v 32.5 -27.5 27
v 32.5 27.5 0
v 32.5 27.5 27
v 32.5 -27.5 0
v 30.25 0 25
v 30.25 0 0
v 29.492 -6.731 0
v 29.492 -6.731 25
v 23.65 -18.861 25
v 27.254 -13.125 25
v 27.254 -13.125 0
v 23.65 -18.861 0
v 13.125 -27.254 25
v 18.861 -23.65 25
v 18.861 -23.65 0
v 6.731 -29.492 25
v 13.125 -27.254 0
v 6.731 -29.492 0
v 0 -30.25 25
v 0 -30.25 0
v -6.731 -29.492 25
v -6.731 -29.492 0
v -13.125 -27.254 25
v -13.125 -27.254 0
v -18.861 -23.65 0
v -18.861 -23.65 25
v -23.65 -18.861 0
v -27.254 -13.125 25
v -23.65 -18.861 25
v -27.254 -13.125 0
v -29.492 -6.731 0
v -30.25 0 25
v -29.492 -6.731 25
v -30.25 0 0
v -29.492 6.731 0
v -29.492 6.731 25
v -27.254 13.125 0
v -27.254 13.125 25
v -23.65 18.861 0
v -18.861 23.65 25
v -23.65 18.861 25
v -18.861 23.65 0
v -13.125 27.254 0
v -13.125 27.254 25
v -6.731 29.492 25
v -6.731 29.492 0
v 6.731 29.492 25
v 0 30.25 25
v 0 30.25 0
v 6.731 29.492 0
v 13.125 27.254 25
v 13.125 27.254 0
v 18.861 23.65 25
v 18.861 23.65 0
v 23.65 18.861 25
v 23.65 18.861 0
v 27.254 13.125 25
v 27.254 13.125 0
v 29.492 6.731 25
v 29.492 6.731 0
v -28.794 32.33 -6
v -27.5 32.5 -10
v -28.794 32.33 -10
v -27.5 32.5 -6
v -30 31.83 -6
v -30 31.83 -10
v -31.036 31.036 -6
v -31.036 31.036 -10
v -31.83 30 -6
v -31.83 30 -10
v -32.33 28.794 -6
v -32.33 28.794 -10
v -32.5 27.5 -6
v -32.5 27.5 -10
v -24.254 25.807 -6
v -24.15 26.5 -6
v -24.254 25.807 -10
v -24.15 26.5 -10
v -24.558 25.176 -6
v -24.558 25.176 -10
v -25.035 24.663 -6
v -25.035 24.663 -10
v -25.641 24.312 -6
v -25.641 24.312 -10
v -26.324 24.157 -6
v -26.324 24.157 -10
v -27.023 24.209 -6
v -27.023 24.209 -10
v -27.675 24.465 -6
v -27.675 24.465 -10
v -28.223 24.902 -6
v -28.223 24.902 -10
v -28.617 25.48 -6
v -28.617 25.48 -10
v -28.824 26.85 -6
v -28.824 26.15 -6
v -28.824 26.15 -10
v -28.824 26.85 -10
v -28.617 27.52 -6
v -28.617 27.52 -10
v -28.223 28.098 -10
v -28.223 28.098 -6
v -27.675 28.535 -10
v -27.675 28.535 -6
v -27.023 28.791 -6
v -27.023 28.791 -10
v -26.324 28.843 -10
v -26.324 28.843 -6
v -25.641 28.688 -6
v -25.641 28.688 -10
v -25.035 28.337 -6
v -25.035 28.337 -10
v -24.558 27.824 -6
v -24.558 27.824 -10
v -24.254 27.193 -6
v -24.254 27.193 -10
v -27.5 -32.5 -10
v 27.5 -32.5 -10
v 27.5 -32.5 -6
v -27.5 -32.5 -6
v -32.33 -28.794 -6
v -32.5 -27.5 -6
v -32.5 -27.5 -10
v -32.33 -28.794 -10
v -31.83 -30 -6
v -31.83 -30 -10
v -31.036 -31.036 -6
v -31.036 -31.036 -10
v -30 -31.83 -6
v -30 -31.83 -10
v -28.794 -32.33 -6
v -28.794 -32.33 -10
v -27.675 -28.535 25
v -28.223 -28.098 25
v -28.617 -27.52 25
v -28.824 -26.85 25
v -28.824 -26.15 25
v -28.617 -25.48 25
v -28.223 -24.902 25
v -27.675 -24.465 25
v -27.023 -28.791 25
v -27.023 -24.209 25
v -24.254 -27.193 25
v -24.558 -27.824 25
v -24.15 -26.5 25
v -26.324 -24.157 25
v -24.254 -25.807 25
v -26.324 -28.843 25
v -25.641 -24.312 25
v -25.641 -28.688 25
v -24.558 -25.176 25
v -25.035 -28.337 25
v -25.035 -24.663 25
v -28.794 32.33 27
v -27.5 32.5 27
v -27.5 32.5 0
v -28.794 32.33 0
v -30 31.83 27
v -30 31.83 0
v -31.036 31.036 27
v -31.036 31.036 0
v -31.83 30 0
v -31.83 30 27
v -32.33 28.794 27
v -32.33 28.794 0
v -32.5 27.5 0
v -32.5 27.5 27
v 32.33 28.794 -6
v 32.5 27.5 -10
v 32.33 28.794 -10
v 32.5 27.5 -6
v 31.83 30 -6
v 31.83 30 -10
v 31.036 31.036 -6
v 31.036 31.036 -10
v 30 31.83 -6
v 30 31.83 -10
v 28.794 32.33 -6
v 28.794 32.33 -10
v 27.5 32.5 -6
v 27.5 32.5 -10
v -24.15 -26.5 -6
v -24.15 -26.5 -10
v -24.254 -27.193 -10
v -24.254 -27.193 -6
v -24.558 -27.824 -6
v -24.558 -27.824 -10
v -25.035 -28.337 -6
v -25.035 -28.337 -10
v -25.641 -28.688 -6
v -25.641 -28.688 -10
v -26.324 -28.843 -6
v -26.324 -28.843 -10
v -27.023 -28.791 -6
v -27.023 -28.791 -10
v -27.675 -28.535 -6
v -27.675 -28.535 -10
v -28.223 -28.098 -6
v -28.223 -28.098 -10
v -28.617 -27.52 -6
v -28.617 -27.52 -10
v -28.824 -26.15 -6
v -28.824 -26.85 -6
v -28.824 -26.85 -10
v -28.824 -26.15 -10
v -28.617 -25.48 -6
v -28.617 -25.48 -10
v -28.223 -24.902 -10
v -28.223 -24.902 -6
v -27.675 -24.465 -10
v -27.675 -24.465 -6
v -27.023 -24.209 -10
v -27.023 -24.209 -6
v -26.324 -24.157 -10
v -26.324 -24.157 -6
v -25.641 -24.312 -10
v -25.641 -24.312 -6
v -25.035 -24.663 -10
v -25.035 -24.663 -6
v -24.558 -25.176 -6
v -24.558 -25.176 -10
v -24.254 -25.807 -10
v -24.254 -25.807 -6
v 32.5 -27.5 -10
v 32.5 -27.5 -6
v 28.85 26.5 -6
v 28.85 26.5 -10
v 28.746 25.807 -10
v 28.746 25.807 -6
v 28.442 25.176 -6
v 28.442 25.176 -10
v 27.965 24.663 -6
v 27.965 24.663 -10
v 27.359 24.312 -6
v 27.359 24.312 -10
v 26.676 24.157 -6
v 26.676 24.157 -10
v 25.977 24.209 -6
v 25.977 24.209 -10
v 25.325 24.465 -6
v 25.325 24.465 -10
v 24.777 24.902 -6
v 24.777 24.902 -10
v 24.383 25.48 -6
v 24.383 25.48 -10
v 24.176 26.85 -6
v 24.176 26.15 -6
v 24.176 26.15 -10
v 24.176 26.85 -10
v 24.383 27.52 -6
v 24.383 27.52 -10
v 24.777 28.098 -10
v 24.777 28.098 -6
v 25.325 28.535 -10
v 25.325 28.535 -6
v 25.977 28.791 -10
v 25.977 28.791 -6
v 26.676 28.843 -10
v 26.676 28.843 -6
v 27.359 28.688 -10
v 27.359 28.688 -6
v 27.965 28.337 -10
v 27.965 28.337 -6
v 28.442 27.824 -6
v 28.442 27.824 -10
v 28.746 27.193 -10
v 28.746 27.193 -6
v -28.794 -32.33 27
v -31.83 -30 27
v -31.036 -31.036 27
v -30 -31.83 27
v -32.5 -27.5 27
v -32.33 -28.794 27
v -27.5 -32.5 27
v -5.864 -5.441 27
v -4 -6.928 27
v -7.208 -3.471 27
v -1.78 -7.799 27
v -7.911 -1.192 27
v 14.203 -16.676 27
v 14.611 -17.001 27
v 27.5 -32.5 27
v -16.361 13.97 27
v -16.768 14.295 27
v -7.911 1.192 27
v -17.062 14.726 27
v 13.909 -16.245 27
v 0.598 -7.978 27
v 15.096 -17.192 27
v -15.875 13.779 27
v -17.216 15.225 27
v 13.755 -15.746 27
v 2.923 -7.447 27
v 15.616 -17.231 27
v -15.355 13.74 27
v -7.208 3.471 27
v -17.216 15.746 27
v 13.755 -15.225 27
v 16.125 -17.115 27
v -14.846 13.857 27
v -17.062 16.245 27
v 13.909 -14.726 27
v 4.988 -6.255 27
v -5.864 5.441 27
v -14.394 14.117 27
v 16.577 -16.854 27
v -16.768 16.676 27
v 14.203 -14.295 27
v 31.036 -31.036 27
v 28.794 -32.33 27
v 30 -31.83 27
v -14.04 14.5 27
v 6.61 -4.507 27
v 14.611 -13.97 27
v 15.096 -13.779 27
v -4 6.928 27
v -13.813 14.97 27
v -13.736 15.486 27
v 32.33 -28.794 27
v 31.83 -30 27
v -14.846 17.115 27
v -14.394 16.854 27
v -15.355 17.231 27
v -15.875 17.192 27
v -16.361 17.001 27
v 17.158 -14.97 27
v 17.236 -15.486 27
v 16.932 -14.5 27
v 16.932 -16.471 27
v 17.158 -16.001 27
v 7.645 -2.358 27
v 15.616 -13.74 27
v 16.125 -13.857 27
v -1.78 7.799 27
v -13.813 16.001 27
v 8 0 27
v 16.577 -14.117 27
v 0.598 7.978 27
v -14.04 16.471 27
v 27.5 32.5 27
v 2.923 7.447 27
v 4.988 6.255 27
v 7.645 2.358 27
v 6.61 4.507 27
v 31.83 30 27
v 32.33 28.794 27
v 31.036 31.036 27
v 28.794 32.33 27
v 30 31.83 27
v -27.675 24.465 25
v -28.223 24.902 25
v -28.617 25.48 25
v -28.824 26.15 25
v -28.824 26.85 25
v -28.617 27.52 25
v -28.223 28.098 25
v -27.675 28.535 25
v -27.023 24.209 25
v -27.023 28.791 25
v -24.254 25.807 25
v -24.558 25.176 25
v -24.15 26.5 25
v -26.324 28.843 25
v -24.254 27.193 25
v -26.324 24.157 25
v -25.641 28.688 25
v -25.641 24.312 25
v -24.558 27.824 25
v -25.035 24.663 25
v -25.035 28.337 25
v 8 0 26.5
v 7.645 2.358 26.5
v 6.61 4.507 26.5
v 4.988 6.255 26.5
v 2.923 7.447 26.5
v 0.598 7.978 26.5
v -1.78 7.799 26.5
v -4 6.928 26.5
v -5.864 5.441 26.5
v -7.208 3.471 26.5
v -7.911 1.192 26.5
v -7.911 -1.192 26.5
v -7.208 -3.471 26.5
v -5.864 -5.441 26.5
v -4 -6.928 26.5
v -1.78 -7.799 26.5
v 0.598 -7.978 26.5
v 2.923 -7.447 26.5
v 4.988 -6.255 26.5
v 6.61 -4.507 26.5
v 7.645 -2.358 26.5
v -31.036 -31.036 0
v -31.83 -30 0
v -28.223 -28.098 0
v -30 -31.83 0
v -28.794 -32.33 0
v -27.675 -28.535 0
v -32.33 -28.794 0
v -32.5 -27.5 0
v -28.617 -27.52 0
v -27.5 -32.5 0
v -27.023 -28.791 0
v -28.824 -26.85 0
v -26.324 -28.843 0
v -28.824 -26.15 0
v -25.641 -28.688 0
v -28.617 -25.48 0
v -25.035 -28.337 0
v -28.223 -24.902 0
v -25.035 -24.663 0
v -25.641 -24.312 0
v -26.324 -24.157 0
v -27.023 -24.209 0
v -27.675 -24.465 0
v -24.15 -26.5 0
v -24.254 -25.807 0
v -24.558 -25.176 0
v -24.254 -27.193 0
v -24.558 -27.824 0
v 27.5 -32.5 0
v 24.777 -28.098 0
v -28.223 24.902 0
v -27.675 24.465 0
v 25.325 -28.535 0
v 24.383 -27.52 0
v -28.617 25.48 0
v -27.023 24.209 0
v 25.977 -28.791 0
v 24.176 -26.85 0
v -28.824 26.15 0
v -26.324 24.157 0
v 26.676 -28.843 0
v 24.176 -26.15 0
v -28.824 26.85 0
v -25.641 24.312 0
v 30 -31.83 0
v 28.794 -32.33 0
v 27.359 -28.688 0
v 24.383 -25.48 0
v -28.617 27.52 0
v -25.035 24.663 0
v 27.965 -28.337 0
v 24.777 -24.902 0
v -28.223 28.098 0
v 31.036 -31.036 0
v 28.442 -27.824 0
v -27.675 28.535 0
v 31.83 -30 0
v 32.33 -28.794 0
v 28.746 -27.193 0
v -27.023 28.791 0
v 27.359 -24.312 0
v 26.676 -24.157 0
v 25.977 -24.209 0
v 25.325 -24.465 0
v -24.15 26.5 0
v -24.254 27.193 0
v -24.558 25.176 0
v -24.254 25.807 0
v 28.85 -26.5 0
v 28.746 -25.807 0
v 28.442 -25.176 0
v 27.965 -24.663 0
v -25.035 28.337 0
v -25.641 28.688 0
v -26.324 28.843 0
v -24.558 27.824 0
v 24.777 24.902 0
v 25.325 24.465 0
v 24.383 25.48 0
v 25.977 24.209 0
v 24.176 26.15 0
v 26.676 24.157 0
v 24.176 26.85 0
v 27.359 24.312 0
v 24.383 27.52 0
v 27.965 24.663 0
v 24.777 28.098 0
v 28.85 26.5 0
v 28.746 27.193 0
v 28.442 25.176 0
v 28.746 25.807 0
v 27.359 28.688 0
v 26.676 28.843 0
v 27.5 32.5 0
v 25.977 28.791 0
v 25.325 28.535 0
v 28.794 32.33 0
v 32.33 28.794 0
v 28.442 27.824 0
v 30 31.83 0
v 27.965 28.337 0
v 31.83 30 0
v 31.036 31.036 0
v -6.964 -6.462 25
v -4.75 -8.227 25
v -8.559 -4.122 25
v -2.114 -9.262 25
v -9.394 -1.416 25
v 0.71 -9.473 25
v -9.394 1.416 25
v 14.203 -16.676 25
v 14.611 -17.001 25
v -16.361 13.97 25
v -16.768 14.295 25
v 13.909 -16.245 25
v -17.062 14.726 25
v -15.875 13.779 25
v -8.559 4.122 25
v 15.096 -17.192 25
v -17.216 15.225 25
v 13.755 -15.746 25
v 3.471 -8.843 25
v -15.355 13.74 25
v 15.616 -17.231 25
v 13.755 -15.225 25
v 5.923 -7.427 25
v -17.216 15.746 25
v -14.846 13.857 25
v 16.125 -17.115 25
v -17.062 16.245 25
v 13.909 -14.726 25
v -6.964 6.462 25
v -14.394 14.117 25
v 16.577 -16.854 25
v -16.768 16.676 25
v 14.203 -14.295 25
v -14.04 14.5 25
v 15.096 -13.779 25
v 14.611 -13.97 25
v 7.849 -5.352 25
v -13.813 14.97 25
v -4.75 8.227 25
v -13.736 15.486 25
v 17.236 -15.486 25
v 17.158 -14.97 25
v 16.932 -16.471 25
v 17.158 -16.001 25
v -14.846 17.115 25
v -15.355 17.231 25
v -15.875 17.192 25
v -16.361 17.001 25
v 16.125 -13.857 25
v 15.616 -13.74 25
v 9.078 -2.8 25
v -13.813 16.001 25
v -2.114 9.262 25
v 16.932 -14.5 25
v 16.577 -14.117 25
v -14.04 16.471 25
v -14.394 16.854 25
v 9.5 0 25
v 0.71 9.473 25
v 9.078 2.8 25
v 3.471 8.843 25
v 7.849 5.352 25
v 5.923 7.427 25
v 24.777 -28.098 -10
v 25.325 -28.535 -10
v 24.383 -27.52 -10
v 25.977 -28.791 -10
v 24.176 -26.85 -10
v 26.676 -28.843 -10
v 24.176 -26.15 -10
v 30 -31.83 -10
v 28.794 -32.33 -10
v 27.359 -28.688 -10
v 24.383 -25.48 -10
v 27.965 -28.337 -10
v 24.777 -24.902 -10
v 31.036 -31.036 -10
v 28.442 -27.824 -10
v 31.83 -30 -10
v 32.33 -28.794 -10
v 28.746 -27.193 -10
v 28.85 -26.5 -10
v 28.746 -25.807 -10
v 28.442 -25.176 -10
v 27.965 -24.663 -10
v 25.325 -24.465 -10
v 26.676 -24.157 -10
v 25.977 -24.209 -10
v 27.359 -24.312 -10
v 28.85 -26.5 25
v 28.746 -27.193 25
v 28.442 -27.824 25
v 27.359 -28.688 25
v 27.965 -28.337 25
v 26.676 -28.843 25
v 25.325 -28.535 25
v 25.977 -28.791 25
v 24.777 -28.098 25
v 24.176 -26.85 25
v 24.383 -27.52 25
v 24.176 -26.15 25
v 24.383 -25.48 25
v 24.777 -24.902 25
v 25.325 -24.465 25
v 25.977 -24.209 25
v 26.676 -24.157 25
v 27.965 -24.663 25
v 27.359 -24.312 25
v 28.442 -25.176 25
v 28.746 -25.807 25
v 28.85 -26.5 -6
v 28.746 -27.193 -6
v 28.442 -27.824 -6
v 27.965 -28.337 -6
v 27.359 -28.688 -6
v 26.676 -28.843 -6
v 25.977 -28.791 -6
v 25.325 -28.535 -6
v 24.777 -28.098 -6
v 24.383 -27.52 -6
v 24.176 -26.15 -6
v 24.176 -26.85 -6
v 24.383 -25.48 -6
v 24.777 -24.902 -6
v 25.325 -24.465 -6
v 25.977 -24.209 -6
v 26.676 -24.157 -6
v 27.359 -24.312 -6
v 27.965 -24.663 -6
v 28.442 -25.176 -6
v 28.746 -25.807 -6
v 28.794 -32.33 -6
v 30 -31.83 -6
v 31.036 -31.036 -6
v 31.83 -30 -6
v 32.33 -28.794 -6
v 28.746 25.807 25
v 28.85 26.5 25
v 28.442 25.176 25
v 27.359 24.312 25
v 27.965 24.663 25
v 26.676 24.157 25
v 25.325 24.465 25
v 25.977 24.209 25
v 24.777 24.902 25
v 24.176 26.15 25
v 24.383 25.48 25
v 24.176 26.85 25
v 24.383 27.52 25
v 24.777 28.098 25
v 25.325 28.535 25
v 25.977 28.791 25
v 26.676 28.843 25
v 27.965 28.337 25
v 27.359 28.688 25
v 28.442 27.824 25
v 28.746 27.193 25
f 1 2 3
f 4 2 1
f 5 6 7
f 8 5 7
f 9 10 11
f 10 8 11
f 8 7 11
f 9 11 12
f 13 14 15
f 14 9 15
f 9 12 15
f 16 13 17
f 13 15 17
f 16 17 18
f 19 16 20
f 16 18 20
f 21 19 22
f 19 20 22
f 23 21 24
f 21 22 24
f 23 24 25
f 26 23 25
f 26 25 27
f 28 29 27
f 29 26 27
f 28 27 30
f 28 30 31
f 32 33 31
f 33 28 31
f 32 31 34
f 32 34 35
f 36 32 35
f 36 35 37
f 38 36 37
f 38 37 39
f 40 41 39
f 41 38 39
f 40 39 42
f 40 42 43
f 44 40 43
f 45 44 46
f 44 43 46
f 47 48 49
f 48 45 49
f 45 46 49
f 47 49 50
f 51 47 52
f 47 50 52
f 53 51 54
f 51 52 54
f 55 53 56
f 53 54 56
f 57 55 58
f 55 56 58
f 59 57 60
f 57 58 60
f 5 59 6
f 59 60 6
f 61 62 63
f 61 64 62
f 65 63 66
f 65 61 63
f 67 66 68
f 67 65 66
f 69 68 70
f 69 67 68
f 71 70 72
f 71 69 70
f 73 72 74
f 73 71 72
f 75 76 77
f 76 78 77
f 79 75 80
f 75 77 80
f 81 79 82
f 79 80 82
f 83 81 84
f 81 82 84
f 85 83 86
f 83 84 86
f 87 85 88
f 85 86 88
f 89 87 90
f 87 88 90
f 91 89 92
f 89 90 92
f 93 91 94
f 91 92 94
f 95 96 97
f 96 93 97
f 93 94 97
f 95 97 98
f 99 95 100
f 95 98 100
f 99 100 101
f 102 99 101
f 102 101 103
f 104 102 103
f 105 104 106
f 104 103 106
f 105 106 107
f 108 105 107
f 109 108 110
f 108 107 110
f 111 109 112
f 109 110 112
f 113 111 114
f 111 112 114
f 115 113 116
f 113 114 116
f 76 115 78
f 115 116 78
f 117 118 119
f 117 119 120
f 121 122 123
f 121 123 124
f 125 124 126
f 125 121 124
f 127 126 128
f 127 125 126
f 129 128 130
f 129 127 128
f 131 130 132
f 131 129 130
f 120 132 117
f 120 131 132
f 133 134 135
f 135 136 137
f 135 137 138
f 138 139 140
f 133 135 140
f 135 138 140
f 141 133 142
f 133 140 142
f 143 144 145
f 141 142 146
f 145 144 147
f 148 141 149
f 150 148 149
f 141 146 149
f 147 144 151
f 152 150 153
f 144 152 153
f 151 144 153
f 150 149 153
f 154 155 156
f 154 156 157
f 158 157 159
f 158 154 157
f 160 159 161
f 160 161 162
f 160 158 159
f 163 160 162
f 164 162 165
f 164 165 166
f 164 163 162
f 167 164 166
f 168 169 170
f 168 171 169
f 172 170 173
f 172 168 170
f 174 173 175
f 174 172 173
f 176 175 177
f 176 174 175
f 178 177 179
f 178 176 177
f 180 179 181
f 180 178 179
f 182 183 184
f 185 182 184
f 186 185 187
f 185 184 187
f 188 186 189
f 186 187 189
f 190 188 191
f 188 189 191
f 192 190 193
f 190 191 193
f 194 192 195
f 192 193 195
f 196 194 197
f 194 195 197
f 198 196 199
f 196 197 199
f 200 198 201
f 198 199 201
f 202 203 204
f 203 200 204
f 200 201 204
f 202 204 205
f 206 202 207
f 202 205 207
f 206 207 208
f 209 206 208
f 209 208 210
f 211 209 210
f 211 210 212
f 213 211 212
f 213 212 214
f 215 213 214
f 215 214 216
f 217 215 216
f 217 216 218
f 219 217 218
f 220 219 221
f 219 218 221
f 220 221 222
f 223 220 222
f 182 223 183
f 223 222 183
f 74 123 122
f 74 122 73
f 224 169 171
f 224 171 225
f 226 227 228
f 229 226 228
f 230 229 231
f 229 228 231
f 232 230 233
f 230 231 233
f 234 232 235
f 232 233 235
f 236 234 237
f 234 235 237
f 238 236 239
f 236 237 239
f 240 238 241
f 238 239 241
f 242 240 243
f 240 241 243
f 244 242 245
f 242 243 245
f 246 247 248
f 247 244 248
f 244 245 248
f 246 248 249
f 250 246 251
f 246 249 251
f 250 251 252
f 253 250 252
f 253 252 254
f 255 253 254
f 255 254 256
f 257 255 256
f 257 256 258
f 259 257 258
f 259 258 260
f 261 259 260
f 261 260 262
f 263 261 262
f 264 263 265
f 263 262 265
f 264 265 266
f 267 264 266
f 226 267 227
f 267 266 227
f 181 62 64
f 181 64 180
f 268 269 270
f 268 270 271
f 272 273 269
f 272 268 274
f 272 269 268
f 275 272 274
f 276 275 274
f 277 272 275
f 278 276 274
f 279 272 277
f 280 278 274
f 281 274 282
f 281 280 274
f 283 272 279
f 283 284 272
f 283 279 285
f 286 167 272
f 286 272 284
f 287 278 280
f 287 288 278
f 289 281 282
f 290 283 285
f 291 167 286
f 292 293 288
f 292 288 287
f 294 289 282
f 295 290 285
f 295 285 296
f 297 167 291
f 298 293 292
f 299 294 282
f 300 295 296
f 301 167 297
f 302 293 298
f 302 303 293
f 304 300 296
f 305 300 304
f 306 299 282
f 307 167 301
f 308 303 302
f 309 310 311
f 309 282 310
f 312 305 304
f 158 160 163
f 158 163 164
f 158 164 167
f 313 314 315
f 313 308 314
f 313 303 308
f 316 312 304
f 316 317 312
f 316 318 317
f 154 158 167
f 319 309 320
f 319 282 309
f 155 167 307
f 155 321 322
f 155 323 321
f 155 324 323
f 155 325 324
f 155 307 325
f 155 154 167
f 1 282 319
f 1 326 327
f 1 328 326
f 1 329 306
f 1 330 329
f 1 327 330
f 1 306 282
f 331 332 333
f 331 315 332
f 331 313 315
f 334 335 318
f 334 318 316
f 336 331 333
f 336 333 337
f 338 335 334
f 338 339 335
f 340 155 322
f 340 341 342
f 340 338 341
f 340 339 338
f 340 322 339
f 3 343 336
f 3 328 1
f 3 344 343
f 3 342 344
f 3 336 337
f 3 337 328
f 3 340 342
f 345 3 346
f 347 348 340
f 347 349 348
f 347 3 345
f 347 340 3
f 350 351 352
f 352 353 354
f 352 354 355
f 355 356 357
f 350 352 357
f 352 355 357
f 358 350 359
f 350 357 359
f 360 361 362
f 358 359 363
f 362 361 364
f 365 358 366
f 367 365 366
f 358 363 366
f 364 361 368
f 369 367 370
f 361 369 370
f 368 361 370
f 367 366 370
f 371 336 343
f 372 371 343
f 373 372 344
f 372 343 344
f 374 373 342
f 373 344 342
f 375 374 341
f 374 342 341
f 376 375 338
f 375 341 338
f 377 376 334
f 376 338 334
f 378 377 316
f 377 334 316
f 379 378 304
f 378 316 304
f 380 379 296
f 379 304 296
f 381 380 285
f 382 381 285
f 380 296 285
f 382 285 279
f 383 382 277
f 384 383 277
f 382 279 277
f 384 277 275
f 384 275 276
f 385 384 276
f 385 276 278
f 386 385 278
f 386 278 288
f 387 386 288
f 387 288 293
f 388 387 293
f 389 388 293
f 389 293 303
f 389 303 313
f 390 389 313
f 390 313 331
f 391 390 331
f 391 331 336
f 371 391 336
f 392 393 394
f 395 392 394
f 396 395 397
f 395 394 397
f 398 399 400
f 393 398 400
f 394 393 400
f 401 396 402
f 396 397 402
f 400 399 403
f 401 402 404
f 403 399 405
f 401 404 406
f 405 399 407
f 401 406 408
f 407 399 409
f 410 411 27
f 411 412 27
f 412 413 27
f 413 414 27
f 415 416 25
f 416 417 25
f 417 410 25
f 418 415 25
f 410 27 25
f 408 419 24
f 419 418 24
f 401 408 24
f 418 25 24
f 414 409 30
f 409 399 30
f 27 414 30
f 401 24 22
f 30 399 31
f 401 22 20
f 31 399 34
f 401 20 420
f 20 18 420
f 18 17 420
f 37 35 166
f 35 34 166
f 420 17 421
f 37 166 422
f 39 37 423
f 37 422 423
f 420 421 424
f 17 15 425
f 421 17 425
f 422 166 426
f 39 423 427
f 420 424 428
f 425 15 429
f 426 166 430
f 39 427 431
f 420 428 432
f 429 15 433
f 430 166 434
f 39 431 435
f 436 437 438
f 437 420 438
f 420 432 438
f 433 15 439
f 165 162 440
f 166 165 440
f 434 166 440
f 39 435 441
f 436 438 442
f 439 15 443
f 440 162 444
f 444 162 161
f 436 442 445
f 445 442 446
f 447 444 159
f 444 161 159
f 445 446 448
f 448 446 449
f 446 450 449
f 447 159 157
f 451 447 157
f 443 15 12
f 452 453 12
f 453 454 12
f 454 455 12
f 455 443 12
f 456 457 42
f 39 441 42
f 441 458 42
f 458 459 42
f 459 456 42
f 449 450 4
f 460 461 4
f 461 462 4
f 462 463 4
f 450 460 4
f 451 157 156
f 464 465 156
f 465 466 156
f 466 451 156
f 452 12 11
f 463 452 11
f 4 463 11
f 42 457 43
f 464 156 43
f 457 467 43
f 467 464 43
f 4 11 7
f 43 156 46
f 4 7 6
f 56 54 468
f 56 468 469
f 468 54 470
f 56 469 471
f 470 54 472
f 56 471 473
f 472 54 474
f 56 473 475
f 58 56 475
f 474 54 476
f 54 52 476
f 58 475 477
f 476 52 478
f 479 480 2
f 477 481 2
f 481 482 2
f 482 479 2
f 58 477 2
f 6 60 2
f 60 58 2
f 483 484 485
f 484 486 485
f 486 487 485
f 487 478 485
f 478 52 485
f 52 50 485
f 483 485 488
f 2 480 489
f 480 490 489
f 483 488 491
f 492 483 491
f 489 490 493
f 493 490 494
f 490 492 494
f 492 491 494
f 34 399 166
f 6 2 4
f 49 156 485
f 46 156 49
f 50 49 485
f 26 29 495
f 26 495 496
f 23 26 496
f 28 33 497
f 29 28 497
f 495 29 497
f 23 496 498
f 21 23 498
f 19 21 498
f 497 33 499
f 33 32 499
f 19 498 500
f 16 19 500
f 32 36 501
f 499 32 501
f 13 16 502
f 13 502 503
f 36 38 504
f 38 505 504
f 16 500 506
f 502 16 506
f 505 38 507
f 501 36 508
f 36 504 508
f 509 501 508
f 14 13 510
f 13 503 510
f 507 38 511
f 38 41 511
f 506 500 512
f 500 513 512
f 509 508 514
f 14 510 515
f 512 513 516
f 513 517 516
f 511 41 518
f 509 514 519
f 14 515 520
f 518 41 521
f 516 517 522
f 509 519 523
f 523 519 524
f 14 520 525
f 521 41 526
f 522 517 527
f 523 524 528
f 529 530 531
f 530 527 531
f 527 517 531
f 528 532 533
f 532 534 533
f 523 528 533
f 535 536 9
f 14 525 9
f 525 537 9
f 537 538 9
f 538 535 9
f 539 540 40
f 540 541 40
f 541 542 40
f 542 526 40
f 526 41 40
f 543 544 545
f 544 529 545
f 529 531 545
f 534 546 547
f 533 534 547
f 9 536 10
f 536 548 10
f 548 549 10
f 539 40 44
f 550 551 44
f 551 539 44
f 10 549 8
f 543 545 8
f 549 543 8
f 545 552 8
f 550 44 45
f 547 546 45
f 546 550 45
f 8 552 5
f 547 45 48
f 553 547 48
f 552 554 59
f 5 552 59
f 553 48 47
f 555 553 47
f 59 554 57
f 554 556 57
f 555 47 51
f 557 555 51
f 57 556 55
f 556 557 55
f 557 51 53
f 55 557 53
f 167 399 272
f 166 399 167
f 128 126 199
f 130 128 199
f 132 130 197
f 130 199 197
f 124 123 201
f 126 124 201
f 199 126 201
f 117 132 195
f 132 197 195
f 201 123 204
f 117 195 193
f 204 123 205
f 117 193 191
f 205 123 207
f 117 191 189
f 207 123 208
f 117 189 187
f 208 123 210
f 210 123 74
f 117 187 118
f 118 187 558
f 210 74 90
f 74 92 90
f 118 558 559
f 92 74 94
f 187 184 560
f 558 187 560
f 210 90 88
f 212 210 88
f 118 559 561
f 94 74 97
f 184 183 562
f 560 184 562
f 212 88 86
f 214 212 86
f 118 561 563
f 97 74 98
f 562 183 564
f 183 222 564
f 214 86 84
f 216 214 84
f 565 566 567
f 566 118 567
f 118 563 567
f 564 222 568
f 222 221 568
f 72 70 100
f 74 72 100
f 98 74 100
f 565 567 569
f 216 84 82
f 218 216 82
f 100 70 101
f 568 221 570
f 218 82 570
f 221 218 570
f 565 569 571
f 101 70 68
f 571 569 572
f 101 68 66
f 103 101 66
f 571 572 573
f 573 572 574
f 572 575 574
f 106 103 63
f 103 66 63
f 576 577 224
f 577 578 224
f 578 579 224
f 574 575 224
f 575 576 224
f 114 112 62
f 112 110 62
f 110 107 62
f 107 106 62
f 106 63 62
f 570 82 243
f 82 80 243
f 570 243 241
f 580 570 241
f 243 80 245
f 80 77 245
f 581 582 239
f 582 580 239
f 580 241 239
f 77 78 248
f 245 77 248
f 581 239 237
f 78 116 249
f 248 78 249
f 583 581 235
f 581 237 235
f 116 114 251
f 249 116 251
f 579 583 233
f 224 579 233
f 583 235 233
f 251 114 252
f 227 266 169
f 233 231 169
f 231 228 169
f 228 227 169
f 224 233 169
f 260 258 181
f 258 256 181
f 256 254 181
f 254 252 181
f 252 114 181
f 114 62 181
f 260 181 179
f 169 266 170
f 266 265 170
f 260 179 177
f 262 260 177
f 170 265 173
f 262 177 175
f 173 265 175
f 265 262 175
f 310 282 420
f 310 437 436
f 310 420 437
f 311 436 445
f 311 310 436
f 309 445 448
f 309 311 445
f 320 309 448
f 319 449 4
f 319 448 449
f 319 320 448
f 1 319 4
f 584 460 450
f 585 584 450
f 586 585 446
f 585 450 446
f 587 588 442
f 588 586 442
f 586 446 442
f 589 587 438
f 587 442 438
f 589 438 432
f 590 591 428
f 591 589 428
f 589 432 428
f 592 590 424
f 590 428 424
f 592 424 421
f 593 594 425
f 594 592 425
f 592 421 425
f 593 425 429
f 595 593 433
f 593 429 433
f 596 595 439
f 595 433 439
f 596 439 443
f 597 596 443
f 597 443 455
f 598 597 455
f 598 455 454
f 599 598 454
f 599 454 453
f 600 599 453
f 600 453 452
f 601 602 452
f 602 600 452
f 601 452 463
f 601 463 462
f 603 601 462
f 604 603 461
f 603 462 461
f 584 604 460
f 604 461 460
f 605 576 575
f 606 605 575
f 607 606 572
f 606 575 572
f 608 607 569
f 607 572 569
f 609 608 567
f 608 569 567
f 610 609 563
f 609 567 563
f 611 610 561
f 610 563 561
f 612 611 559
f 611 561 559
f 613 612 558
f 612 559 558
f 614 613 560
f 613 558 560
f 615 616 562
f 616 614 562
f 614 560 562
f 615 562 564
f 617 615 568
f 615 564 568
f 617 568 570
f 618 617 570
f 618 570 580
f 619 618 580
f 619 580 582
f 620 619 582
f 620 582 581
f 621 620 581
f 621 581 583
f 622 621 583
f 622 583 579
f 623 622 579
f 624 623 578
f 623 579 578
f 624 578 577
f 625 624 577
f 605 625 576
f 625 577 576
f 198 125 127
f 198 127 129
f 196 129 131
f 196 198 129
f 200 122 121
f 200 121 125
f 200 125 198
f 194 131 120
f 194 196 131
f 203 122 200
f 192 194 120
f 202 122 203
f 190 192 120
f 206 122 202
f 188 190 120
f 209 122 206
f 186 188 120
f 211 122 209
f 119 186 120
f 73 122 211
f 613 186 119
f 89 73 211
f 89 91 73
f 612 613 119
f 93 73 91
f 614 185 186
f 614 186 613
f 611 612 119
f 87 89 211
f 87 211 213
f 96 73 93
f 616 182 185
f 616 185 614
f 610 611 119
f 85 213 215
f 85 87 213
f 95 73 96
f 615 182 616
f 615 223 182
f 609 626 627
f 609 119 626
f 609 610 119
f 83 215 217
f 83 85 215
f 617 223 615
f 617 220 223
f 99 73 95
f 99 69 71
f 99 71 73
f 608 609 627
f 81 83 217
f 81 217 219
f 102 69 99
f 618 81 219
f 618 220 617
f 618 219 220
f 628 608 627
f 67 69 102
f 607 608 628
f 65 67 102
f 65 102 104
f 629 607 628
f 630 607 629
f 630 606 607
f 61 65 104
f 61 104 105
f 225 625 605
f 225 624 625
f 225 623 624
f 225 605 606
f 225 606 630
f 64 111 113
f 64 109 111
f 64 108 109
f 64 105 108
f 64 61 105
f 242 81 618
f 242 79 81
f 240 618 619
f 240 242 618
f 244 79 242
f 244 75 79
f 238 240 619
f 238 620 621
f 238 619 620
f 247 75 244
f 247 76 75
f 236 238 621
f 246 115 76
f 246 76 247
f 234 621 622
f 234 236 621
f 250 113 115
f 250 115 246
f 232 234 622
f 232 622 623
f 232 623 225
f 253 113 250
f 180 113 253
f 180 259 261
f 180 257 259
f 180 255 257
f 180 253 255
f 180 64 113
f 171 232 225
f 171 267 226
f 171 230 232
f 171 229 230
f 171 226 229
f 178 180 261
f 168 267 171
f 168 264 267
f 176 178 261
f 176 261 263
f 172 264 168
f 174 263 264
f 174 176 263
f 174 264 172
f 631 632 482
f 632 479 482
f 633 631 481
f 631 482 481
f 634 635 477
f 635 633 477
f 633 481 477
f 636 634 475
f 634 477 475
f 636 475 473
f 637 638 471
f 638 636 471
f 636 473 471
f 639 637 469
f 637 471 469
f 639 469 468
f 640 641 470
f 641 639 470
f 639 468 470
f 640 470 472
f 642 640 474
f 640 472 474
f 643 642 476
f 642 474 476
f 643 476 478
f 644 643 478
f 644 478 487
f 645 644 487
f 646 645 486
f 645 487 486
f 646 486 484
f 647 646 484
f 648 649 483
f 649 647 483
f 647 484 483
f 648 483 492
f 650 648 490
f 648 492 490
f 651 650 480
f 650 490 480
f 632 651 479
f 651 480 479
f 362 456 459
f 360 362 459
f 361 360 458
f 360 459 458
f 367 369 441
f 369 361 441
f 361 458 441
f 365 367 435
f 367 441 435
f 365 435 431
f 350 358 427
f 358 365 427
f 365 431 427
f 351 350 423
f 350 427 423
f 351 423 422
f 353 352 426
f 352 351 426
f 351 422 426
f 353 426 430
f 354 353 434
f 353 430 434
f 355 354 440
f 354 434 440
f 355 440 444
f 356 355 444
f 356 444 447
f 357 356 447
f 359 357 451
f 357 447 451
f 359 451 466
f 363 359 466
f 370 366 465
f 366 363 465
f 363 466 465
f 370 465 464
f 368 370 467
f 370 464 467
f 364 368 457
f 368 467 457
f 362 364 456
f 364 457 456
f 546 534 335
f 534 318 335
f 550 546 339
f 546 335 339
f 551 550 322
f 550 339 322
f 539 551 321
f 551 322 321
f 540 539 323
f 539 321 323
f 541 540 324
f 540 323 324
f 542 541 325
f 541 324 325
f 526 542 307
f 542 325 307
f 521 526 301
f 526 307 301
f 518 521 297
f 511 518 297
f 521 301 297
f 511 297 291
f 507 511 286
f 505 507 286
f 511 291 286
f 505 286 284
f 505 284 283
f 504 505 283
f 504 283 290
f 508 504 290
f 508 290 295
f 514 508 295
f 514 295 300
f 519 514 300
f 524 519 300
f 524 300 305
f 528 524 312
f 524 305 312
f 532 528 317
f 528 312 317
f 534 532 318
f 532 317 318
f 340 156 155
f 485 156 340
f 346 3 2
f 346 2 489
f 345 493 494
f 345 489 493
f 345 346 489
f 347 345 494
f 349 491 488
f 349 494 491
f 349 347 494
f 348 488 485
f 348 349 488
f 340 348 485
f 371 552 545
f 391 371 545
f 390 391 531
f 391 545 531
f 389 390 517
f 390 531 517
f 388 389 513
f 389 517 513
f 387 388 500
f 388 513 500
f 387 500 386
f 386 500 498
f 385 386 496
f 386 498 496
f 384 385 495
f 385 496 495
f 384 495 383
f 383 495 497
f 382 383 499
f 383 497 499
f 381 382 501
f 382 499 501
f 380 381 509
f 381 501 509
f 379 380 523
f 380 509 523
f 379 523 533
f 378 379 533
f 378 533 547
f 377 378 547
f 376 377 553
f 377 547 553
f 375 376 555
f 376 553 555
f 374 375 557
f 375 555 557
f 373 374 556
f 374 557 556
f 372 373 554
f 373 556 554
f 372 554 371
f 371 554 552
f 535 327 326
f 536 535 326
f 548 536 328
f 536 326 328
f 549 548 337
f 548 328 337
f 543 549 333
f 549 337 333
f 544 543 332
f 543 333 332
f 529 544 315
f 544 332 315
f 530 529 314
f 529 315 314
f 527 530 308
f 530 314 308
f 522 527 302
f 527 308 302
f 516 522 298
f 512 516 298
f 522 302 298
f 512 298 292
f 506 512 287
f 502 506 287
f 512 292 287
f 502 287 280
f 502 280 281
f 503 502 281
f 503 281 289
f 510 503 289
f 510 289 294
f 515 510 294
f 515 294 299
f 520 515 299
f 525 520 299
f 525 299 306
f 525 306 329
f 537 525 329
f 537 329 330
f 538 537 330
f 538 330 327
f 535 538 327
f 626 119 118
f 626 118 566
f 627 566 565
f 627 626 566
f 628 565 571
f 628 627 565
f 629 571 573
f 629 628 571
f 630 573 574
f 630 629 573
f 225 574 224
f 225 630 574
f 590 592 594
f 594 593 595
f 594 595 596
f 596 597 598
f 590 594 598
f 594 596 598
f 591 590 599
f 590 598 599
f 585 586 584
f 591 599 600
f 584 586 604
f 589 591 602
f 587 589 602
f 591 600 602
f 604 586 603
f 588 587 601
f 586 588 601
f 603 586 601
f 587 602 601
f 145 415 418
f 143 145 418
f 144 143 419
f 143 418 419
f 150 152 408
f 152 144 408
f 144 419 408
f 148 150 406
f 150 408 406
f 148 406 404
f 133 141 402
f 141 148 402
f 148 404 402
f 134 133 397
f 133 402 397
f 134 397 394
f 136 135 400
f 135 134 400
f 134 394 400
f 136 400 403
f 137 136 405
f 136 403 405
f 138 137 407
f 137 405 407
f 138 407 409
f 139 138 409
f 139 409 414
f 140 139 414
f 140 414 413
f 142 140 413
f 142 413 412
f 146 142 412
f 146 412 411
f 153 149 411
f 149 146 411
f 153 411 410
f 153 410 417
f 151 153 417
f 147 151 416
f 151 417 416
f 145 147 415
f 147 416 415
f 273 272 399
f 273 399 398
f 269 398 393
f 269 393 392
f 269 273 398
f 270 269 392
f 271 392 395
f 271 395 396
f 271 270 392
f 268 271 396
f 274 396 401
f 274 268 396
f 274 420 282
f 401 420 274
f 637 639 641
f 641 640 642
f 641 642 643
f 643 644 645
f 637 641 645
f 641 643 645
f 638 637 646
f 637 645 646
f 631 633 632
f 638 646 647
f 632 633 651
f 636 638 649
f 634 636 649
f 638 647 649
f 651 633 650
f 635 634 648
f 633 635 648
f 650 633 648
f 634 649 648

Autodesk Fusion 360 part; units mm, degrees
sketch "Sketch1" plane through (0, 0, 0) normal (0, 0, 1) x (1, 0, 0)
  line L0 (-32.5, 32.5) -> (32.5, 32.5)
  line L1 (32.5, 32.5) -> (32.5, -32.5)
  line L2 (32.5, -32.5) -> (-32.5, -32.5)
  line L3 (-32.5, -32.5) -> (-32.5, 32.5)
  line L4 (-32.5, 32.5) -> (32.5, -32.5) construction
  line L5 (32.5, 32.5) -> (-32.5, -32.5) construction
  circle A0 centre (-26.5, 26.5) radius 2.35
  line L6 (-32.5, 0) -> (32.5, 0) construction
  line L7 (0, 32.5) -> (0, -32.5) construction
  circle A1 centre (-26.5, -26.5) radius 2.35
  circle A2 centre (26.5, -26.5) radius 2.35
  circle A3 centre (26.5, 26.5) radius 2.35
  circle A4 centre (0, 0) radius 30.25
  circle A5 centre (0, 0) radius 8
  circle A6 centre (0, 0) radius 6.2
  dimension "d1" = 65
  dimension "d2" = 65
  dimension "d3" = 4.7
  dimension "d4" = 26.5
  dimension "d6" = 360
  dimension "d7" = 60.5
  dimension "d17" = 12.4
  dimension "d18" = 16
extrude "Extrude1" add sketch "Sketch1" along normal blind 27 contours L0 L1 L2 L3 makes body 1
sketch "Sketch2" plane through (0, 0, 27) normal (0, 0, 1) x (1, 0, 0)
  circle A0 centre (26.5, -26.5) radius 2.35
  circle A1 centre (-26.5, 26.5) radius 2.35
  circle A2 centre (-26.5, -26.5) radius 2.35
  circle A3 centre (26.5, 26.5) radius 2.35
  circle A4 centre (0, 0) radius 30.25
  line L0 (-32.5, -32.5) -> (32.5, -32.5)
  line L1 (32.5, -32.5) -> (32.5, 32.5)
  line L2 (32.5, 32.5) -> (-32.5, 32.5)
  line L3 (-32.5, 32.5) -> (-32.5, -32.5)
  circle A5 centre (0, 0) radius 8
  line L4 (-32.5, 32.5) -> (32.5, -32.5) construction
  line L5 (32.5, 32.5) -> (-32.5, -32.5) construction
  circle A6 centre (-15.4856, 15.4856) radius 1.75
  circle A7 centre (15.4856, -15.4856) radius 1.75
  dimension "d14" = 16
  dimension "d15" = 3.5
  dimension "d16" = 21.9
extrude "Extrude2" add sketch "Sketch2" against normal blind 2 contours A0 | A1 | A2 | A3 | A4 bodies 1
fillet "Fillet1" radius 5 4 edges at (-32.5, 32.5, 13.5) (32.5, 32.5, 13.5) (-32.5, -32.5, 13.5) (32.5, -32.5, 13.5) on bodies 1
extrude "Extrude3" add sketch "Sketch1" along normal blind 14 separate body contours A5 makes body 2
sketch "Sketch3" plane through (0, 0, 14) normal (0, 0, 1) x (1, 0, 0)
  circle A0 centre (0, 0) radius 6.2
  circle A1 centre (0, 0) radius 8
  line L0 (0, 32.5) -> (0, -32.5) construction
  line L1 (0, 0) -> (-0.946, -4.4506) construction
  line L2 (0, 0) -> (0.4286, -4.0775) construction
  line L3 (0.4756, -4.5251) -> (0.4286, -4.0775)
  line L4 (-0.4756, -4.5251) -> (-0.4286, -4.0775)
  arc A2 (-0.4756, -4.5251) -> (0.4756, -4.5251) centre (0, 0) ccw
  line L5 (2.275, -3.9404) -> (2.05, -3.5507)
  arc A3 (1.406, -4.3273) -> (2.275, -3.9404) centre (0, 0) ccw
  line L6 (1.406, -4.3273) -> (1.267, -3.8993)
  line L7 (3.681, -2.6744) -> (3.317, -2.4099)
  arc A4 (3.0445, -3.3813) -> (3.681, -2.6744) centre (0, 0) ccw
  line L8 (3.0445, -3.3813) -> (2.7434, -3.0469)
  line L9 (4.4506, -0.946) -> (4.0104, -0.8524)
  arc A5 (4.1566, -1.8507) -> (4.4506, -0.946) centre (0, 0) ccw
  line L10 (4.1566, -1.8507) -> (3.7455, -1.6676)
  line L11 (4.4506, 0.946) -> (4.0104, 0.8524)
  arc A6 (4.55, 0) -> (4.4506, 0.946) centre (0, 0) ccw
  line L12 (4.55, 0) -> (4.1, 0)
  line L13 (3.681, 2.6744) -> (3.317, 2.4099)
  arc A7 (4.1566, 1.8507) -> (3.681, 2.6744) centre (0, 0) ccw
  line L14 (4.1566, 1.8507) -> (3.7455, 1.6676)
  line L15 (2.275, 3.9404) -> (2.05, 3.5507)
  arc A8 (3.0445, 3.3813) -> (2.275, 3.9404) centre (0, 0) ccw
  line L16 (3.0445, 3.3813) -> (2.7434, 3.0469)
  line L17 (0.4756, 4.5251) -> (0.4286, 4.0775)
  arc A9 (1.406, 4.3273) -> (0.4756, 4.5251) centre (0, 0) ccw
  line L18 (1.406, 4.3273) -> (1.267, 3.8993)
  line L19 (-1.406, 4.3273) -> (-1.267, 3.8993)
  arc A10 (-0.4756, 4.5251) -> (-1.406, 4.3273) centre (0, 0) ccw
  line L20 (-0.4756, 4.5251) -> (-0.4286, 4.0775)
  line L21 (-3.0445, 3.3813) -> (-2.7434, 3.0469)
  arc A11 (-2.275, 3.9404) -> (-3.0445, 3.3813) centre (0, 0) ccw
  line L22 (-2.275, 3.9404) -> (-2.05, 3.5507)
  line L23 (-4.1566, 1.8507) -> (-3.7455, 1.6676)
  arc A12 (-3.681, 2.6744) -> (-4.1566, 1.8507) centre (0, 0) ccw
  line L24 (-3.681, 2.6744) -> (-3.317, 2.4099)
  line L25 (-4.55, 0) -> (-4.1, 0)
  arc A13 (-4.4506, 0.946) -> (-4.55, 0) centre (0, 0) ccw
  line L26 (-4.4506, 0.946) -> (-4.0104, 0.8524)
  line L27 (-4.1566, -1.8507) -> (-3.7455, -1.6676)
  arc A14 (-4.4506, -0.946) -> (-4.1566, -1.8507) centre (0, 0) ccw
  line L28 (-4.4506, -0.946) -> (-4.0104, -0.8524)
  line L29 (-3.0445, -3.3813) -> (-2.7434, -3.0469)
  arc A15 (-3.681, -2.6744) -> (-3.0445, -3.3813) centre (0, 0) ccw
  line L30 (-3.681, -2.6744) -> (-3.317, -2.4099)
  line L31 (-1.406, -4.3273) -> (-1.267, -3.8993)
  arc A16 (-2.275, -3.9404) -> (-1.406, -4.3273) centre (0, 0) ccw
  line L32 (-2.275, -3.9404) -> (-2.05, -3.5507)
  arc A17 (-1.267, -3.8993) -> (-0.4286, -4.0775) centre (0, 0) ccw
  arc A18 (-2.7434, -3.0469) -> (-2.05, -3.5507) centre (0, 0) ccw
  arc A19 (-3.7455, -1.6676) -> (-3.317, -2.4099) centre (0, 0) ccw
  arc A20 (-4.1, 0) -> (-4.0104, -0.8524) centre (0, 0) ccw
  arc A21 (-3.7455, 1.6676) -> (-4.0104, 0.8524) centre (0, 0) ccw
  arc A22 (-2.7434, 3.0469) -> (-3.317, 2.4099) centre (0, 0) ccw
  arc A23 (-1.267, 3.8993) -> (-2.05, 3.5507) centre (0, 0) ccw
  arc A24 (0.4286, 4.0775) -> (-0.4286, 4.0775) centre (0, 0) ccw
  arc A25 (2.05, 3.5507) -> (1.267, 3.8993) centre (0, 0) ccw
  arc A26 (4.0104, -0.8524) -> (4.1, 0) centre (0, 0) ccw
  arc A27 (3.317, -2.4099) -> (3.7455, -1.6676) centre (0, 0) ccw
  arc A28 (0.4286, -4.0775) -> (1.267, -3.8993) centre (0, 0) ccw
  arc A29 (2.05, -3.5507) -> (2.7434, -3.0469) centre (0, 0) ccw
  arc A30 (4.0104, 0.8524) -> (3.7455, 1.6676) centre (0, 0) ccw
  arc A31 (3.317, 2.4099) -> (2.7434, 3.0469) centre (0, 0) ccw
  dimension "d21" = 9.1
  dimension "d23" = 8.2
  dimension "d24" = 6
  dimension "d26" = 360
extrude "Extrude4" add sketch "Sketch3" against normal blind 5 contours A0 bodies 2
chamfer "Chamfer1" distance 1.5 angle 45 1 edges at (-7.4586, -2.8929, 25) on bodies 1
extrude "Extrude5" add sketch "Sketch1" along normal blind 4 from surface at -10 separate body contours L0 L1 L2 L3 | A4 | A5 | A6 makes body 3
fillet "Fillet2" radius 5 4 edges at (-32.5, 32.5, -8) (-32.5, -32.5, -8) (32.5, 32.5, -8) (32.5, -32.5, -8) on bodies 3
hidden bodies 2
equation "d2 = d1"
equation "d4 = ( 53 / 2 ) * 1 mm"
equation "d16 = ( ( 46.3 - 2.5 ) / 2 ) * 1 mm"
